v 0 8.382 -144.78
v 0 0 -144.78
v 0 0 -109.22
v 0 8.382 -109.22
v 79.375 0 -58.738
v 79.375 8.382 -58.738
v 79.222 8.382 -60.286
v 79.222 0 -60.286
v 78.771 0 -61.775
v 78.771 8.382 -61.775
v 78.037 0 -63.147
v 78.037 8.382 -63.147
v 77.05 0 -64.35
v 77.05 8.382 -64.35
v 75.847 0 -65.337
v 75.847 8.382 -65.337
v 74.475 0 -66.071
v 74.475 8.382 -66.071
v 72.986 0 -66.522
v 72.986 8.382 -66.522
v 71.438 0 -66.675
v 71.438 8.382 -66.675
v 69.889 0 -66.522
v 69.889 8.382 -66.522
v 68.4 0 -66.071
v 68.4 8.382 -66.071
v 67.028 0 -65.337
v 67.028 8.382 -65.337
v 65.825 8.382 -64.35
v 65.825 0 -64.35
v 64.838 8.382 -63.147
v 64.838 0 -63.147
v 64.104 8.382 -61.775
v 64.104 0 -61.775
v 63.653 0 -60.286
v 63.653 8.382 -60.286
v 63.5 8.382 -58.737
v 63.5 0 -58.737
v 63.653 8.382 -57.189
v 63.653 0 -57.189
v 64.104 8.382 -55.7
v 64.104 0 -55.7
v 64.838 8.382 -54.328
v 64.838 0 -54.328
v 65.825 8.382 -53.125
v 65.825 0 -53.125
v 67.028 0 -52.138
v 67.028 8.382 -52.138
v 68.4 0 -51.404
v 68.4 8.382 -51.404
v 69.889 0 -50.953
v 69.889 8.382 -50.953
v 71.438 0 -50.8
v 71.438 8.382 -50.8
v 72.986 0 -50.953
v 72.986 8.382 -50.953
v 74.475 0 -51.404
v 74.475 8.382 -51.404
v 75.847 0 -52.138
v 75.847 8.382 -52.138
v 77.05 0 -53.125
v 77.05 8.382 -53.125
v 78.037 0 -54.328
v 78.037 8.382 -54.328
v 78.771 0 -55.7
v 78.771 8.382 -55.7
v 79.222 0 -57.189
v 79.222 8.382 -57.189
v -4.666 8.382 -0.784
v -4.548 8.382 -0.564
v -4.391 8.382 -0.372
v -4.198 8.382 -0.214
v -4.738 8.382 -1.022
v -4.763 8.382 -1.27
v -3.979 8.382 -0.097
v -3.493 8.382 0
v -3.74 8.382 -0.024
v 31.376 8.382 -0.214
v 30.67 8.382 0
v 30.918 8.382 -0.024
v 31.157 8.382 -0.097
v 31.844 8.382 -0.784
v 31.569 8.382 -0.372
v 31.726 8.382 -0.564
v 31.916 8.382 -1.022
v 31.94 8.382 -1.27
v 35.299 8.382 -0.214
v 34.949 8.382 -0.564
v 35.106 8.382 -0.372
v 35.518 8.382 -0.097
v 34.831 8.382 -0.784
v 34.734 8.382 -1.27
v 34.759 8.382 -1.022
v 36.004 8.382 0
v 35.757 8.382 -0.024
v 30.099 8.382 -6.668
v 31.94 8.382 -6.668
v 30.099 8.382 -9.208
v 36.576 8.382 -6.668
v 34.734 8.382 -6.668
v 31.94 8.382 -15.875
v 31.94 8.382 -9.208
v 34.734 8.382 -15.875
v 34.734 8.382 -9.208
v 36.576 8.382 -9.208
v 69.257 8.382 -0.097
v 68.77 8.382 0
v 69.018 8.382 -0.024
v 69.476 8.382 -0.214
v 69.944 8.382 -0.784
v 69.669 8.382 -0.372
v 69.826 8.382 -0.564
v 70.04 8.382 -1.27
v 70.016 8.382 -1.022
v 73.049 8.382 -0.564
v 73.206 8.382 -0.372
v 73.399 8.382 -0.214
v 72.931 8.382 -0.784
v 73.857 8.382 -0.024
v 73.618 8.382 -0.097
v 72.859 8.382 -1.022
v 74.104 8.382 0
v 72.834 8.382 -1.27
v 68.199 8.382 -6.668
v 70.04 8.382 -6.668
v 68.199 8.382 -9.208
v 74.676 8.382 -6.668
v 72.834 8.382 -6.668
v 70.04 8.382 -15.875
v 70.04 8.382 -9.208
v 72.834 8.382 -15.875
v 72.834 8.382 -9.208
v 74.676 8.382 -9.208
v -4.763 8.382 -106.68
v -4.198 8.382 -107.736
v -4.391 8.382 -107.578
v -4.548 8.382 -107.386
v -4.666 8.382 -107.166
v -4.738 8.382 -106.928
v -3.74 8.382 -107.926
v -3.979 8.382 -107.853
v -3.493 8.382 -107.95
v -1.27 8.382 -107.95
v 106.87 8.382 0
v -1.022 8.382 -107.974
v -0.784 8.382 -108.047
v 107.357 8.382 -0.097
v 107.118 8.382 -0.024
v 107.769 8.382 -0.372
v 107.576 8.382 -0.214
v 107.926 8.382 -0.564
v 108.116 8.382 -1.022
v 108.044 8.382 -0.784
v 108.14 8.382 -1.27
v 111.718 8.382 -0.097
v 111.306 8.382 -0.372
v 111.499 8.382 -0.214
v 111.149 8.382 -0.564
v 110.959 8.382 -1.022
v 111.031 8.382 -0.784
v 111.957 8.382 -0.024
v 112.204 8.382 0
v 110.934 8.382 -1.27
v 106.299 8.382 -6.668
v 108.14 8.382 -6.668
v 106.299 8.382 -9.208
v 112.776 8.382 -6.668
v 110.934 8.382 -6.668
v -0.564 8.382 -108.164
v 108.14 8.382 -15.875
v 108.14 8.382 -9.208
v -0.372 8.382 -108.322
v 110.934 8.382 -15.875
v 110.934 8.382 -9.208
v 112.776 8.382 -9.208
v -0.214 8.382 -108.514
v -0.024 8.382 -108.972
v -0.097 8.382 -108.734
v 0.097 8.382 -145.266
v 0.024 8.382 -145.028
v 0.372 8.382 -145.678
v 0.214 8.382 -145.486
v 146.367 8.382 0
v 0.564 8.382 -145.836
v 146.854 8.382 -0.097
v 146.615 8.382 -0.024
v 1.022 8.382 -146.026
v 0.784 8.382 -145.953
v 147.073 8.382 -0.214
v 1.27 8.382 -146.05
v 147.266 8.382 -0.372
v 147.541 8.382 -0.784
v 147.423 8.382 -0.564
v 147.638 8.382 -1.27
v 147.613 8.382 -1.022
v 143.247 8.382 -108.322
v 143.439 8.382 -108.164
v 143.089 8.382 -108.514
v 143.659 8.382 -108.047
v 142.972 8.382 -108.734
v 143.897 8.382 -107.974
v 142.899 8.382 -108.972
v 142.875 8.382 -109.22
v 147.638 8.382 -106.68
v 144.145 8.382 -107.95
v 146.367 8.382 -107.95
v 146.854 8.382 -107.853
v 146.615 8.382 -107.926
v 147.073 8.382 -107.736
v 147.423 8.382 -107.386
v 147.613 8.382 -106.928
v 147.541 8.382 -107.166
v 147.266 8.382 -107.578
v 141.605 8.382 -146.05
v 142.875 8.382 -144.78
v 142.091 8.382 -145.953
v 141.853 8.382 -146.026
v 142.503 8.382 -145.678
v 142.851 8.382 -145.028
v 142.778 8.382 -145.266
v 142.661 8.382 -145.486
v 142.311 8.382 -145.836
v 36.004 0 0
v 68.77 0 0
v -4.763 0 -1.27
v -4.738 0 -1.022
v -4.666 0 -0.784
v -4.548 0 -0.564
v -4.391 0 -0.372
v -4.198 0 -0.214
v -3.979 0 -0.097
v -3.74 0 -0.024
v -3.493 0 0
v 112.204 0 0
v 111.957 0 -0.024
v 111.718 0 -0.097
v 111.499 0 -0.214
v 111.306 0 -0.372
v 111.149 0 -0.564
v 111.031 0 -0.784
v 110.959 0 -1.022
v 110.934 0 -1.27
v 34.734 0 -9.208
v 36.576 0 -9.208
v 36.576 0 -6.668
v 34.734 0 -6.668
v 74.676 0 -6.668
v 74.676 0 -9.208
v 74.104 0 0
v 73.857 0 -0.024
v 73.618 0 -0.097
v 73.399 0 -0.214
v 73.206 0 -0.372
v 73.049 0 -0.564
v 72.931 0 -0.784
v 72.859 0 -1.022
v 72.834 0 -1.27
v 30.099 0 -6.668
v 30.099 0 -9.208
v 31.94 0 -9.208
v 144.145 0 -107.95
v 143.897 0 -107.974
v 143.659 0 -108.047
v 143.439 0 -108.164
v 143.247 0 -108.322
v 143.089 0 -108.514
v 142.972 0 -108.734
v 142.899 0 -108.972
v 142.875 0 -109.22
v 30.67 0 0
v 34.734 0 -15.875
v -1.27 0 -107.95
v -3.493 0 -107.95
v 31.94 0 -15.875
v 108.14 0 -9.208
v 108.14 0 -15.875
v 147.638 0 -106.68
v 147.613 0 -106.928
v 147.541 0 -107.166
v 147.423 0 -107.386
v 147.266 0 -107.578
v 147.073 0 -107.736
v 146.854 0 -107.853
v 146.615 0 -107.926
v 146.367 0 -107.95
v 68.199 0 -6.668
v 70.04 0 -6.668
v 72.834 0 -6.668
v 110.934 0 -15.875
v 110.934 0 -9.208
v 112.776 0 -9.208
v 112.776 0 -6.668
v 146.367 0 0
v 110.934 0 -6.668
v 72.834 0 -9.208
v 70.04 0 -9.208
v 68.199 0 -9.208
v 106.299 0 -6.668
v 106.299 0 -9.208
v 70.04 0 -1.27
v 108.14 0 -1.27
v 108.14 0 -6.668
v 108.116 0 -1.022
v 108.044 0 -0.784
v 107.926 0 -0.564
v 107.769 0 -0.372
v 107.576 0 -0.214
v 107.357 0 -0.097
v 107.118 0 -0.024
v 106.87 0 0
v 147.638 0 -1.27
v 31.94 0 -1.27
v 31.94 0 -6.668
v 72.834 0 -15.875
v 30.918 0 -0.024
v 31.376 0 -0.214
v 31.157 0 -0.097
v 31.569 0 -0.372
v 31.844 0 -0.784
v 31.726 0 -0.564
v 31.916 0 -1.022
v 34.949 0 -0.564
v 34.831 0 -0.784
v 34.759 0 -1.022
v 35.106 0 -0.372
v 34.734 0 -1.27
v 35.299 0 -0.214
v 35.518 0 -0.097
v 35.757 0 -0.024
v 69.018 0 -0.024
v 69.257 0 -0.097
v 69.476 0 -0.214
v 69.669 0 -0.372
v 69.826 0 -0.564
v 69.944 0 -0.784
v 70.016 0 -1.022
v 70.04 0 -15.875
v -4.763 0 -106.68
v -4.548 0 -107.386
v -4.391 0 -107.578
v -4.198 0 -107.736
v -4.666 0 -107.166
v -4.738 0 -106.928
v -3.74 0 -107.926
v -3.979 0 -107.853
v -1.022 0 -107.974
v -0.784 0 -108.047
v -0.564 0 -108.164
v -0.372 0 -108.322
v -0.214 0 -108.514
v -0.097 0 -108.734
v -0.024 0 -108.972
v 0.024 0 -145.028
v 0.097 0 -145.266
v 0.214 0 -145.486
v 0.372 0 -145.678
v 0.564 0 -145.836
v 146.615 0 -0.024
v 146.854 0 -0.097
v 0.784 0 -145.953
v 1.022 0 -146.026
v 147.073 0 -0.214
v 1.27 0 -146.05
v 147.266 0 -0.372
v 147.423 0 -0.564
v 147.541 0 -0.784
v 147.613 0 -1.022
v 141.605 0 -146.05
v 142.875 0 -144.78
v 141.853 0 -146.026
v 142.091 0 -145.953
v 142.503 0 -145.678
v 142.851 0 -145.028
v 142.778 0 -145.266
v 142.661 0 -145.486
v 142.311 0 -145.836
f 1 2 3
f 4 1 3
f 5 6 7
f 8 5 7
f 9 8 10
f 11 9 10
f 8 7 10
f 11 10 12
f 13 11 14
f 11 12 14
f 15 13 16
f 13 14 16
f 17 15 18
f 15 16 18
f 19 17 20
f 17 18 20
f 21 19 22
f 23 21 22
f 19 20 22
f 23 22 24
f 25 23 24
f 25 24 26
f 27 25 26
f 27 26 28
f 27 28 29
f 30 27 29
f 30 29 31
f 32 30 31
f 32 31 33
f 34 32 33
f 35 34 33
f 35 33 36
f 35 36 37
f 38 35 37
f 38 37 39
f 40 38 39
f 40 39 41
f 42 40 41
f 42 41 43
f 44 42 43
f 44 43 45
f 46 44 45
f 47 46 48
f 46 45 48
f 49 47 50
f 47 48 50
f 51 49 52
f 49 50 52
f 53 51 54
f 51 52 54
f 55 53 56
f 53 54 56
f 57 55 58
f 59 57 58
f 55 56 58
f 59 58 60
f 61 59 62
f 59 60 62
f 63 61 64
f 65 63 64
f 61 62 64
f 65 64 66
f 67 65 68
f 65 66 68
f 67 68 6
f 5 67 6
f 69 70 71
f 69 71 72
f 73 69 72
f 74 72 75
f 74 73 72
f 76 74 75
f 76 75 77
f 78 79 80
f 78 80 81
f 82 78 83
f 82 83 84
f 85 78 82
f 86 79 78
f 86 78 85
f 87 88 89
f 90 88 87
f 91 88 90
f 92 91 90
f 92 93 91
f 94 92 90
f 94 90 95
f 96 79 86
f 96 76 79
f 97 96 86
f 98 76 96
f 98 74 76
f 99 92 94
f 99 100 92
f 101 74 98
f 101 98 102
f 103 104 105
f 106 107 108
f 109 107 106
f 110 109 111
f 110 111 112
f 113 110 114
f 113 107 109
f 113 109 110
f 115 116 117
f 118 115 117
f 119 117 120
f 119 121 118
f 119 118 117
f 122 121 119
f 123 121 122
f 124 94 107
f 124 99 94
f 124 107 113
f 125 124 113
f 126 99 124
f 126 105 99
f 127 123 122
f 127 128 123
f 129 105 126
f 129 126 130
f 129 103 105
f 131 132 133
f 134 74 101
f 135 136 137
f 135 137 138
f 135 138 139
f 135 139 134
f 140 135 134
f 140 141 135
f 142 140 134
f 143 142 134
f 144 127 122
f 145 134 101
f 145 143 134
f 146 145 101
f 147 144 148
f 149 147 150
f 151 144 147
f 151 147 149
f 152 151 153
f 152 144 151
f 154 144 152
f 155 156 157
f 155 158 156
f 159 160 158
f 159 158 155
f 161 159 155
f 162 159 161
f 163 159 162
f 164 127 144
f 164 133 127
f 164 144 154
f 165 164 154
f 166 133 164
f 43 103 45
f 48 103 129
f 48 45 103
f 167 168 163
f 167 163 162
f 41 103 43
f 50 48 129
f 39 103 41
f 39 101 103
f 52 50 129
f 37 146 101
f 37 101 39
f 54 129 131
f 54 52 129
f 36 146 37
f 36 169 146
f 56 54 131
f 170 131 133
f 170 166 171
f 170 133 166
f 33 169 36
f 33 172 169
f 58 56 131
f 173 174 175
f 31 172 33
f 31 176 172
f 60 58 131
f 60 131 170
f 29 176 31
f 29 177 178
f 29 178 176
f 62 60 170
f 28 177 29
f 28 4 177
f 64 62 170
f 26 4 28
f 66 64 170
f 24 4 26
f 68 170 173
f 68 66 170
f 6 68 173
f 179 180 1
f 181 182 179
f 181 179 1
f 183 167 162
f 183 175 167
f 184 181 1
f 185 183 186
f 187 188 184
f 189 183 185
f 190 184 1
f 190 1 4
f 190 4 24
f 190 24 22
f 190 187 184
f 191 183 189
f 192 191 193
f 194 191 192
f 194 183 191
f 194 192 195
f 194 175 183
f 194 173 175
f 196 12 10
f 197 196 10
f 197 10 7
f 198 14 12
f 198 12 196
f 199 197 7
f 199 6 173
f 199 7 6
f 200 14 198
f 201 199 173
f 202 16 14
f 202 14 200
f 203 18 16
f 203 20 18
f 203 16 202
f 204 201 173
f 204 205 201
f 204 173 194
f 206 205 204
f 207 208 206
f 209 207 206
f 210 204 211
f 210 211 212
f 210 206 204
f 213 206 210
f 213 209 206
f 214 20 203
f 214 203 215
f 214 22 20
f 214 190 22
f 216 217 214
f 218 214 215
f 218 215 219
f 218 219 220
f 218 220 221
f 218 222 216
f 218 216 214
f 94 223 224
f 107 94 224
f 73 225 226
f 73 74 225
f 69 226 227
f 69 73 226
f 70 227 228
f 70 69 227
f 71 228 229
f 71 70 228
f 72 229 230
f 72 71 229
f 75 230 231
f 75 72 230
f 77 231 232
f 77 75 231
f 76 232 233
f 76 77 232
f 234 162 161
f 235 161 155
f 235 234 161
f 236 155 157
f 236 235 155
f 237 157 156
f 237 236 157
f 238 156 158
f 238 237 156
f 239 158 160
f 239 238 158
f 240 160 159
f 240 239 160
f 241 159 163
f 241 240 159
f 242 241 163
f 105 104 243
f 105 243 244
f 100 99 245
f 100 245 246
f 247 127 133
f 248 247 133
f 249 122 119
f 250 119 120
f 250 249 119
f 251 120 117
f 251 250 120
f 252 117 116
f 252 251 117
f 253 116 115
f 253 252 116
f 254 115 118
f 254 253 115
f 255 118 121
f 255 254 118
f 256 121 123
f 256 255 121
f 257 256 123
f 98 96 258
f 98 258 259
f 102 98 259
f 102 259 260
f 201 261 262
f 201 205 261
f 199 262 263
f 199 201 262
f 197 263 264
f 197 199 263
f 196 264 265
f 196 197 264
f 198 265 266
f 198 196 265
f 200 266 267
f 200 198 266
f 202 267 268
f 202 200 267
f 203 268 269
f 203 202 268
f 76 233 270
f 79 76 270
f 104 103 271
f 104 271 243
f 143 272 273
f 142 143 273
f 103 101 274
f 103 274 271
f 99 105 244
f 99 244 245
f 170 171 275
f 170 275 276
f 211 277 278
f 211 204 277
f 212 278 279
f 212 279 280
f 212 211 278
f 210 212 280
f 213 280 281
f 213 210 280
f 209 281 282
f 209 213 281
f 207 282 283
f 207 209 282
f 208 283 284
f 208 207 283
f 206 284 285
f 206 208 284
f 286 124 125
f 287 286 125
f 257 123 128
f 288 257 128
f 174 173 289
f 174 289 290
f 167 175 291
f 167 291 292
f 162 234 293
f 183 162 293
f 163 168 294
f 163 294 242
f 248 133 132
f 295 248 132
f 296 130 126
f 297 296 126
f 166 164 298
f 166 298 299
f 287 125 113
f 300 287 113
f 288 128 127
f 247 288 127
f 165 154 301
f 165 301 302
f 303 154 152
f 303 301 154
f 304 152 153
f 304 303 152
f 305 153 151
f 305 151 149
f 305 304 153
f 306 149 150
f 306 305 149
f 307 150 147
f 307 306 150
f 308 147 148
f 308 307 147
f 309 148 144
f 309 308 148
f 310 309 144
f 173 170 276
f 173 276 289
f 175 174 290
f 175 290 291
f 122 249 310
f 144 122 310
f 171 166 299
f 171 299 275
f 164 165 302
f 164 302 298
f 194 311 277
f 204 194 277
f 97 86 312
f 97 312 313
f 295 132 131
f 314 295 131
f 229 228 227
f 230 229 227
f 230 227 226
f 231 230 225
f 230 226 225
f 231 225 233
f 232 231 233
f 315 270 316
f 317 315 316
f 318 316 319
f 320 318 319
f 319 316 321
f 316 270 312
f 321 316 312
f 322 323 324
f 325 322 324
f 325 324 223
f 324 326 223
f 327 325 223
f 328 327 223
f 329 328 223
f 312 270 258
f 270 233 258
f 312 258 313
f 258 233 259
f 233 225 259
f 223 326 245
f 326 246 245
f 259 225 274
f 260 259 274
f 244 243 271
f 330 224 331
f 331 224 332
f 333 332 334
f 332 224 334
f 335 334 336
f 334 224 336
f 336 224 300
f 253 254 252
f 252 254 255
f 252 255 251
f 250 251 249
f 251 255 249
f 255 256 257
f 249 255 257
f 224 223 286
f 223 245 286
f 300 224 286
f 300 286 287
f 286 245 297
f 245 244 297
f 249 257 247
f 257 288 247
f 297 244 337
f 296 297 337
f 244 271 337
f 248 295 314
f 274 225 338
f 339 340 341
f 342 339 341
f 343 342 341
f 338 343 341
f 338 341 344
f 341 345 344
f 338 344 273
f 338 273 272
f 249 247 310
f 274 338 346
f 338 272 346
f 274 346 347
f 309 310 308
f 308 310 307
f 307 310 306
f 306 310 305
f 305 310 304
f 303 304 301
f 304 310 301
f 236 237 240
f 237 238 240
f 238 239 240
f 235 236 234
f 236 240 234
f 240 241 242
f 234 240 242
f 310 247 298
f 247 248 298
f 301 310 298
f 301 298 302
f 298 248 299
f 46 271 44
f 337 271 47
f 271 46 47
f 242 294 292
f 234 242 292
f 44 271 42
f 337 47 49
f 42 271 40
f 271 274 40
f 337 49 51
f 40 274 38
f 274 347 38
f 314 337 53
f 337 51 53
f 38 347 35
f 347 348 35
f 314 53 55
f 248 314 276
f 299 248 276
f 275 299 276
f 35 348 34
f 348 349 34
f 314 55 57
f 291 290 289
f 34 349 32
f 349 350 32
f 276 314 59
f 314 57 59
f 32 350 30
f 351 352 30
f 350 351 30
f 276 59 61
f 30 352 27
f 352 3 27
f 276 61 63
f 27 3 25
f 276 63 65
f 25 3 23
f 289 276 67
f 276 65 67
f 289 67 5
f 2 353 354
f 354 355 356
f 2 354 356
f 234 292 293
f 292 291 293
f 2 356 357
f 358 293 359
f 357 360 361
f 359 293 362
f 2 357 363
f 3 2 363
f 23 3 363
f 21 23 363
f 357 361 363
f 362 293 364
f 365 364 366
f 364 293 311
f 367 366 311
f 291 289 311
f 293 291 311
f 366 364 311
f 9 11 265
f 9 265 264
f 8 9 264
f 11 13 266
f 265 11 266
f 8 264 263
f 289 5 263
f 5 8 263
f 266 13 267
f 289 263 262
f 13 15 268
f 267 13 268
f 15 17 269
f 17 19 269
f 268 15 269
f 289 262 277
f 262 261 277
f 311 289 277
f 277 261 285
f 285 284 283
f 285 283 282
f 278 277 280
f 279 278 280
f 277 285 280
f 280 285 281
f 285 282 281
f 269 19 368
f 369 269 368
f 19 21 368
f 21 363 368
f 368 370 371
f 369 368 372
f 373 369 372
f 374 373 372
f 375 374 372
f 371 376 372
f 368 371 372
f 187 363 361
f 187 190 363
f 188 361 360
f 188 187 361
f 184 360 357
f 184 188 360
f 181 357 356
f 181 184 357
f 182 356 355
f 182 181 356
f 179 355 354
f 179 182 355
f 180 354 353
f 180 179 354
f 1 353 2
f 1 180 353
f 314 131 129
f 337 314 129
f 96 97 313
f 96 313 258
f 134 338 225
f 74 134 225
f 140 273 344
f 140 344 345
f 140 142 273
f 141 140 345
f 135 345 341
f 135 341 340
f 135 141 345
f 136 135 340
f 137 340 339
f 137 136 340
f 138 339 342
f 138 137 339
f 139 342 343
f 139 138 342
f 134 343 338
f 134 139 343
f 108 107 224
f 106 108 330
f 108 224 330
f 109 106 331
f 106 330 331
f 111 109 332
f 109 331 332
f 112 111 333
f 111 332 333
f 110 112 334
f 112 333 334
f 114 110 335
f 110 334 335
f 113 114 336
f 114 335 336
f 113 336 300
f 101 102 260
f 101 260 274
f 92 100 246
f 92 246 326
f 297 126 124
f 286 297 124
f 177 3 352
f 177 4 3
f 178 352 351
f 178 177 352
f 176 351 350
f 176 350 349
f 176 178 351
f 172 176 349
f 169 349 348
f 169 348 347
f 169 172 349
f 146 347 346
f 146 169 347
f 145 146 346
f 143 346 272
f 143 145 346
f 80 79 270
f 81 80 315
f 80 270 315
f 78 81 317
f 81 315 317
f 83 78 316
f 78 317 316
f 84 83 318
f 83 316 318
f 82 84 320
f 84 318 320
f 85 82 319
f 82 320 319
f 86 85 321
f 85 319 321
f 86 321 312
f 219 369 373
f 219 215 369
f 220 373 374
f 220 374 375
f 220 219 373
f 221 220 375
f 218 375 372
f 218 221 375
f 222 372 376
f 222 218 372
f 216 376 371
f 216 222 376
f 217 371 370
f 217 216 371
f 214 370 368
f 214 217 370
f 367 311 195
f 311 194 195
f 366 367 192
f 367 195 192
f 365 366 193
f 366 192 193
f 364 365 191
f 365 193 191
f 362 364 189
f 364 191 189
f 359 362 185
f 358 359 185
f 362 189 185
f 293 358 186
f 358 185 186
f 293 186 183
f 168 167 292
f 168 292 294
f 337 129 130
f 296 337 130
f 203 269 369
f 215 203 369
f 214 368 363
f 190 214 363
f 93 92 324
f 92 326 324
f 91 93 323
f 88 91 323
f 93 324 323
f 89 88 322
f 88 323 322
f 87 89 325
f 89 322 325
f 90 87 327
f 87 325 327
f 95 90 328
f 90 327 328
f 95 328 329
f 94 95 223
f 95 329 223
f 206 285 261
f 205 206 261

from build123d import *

# Parameters (mm, degrees)
BOSS_EXTRUDE1_DEPTH          = 8.382
CUT_EXTRUDE2_DEPTH           = 208.840544241
F_5_8_0_625_DIAMETER_HOLE1_D = 15.875
FILLET1_R                    = 1.27


with BuildPart() as part:
    # Sketch1 → Boss-Extrude1 (new body)
    with BuildSketch(Plane(origin=(0, 0, 0), x_dir=(1, 0, 0), z_dir=(0, 1, 0))):
        Polygon((0, 0), (142.875, 0), (147.6375, 0), (147.6375, 107.95), (142.875, 107.95), (142.875, 146.05), (0, 146.05), (0, 107.95), (-4.7625, 107.95), (-4.7625, 0), align=None)
    extrude(amount=BOSS_EXTRUDE1_DEPTH)

    # Sketch10 → Cut-Extrude2 (cut, through all)
    with BuildSketch(Plane(origin=(0, 8.382, 0), x_dir=(1, 0, 0), z_dir=(0, 1, 0))):
        Polygon((70.0405, 9.2075), (68.199, 9.2075), (68.199, 6.6675), (70.0405, 6.6675), (70.0405, 0), (72.8345, 0), (72.8345, 6.6675), (74.676, 6.6675), (74.676, 9.2075), (72.8345, 9.2075), (72.8345, 15.875), (70.0405, 15.875), align=None)
        Polygon((108.1405, 15.875), (110.9345, 15.875), (110.9345, 9.2075), (112.776, 9.2075), (112.776, 6.6675), (110.9345, 6.6675), (110.9345, 0), (108.1405, 0), (108.1405, 6.6675), (106.299, 6.6675), (106.299, 9.2075), (108.1405, 9.2075), align=None)
        Polygon((34.7345, 15.875), (34.7345, 9.2075), (36.576, 9.2075), (36.576, 6.6675), (34.7345, 6.6675), (34.7345, 0), (31.9405, 0), (31.9405, 6.6675), (30.099, 6.6675), (30.099, 9.2075), (31.9405, 9.2075), (31.9405, 15.875), align=None)
    extrude(amount=-CUT_EXTRUDE2_DEPTH, mode=Mode.SUBTRACT)

    # 5/8 (0.625) Diameter Hole1 (through all)
    with Locations(Plane(origin=(0, 0, 0), x_dir=(-1, 0, 0), z_dir=(0, -1, 0))):
        with Locations((-71.4375, 58.7375)):
            Hole(F_5_8_0_625_DIAMETER_HOLE1_D / 2)

    # Fillet1
    fillet1_edges = [part.edges().sort_by_distance(p)[0] for p in [
        (34.7345, 4.191, 0),
        (31.9405, 4.191, 0),
        (-4.7625, 4.191, 0),
        (-4.7625, 4.191, -107.95),
        (0, 4.191, -107.95),
        (0, 4.191, -146.05),
        (142.875, 4.191, -146.05),
        (142.875, 4.191, -107.95),
        (147.6375, 4.191, -107.95),
        (147.6375, 4.191, 0),
        (72.8345, 4.191, 0),
        (70.0405, 4.191, 0),
        (110.9345, 4.191, 0),
        (108.1405, 4.191, 0),
    ]]
    fillet(fillet1_edges, radius=FILLET1_R)


solid = part.part
